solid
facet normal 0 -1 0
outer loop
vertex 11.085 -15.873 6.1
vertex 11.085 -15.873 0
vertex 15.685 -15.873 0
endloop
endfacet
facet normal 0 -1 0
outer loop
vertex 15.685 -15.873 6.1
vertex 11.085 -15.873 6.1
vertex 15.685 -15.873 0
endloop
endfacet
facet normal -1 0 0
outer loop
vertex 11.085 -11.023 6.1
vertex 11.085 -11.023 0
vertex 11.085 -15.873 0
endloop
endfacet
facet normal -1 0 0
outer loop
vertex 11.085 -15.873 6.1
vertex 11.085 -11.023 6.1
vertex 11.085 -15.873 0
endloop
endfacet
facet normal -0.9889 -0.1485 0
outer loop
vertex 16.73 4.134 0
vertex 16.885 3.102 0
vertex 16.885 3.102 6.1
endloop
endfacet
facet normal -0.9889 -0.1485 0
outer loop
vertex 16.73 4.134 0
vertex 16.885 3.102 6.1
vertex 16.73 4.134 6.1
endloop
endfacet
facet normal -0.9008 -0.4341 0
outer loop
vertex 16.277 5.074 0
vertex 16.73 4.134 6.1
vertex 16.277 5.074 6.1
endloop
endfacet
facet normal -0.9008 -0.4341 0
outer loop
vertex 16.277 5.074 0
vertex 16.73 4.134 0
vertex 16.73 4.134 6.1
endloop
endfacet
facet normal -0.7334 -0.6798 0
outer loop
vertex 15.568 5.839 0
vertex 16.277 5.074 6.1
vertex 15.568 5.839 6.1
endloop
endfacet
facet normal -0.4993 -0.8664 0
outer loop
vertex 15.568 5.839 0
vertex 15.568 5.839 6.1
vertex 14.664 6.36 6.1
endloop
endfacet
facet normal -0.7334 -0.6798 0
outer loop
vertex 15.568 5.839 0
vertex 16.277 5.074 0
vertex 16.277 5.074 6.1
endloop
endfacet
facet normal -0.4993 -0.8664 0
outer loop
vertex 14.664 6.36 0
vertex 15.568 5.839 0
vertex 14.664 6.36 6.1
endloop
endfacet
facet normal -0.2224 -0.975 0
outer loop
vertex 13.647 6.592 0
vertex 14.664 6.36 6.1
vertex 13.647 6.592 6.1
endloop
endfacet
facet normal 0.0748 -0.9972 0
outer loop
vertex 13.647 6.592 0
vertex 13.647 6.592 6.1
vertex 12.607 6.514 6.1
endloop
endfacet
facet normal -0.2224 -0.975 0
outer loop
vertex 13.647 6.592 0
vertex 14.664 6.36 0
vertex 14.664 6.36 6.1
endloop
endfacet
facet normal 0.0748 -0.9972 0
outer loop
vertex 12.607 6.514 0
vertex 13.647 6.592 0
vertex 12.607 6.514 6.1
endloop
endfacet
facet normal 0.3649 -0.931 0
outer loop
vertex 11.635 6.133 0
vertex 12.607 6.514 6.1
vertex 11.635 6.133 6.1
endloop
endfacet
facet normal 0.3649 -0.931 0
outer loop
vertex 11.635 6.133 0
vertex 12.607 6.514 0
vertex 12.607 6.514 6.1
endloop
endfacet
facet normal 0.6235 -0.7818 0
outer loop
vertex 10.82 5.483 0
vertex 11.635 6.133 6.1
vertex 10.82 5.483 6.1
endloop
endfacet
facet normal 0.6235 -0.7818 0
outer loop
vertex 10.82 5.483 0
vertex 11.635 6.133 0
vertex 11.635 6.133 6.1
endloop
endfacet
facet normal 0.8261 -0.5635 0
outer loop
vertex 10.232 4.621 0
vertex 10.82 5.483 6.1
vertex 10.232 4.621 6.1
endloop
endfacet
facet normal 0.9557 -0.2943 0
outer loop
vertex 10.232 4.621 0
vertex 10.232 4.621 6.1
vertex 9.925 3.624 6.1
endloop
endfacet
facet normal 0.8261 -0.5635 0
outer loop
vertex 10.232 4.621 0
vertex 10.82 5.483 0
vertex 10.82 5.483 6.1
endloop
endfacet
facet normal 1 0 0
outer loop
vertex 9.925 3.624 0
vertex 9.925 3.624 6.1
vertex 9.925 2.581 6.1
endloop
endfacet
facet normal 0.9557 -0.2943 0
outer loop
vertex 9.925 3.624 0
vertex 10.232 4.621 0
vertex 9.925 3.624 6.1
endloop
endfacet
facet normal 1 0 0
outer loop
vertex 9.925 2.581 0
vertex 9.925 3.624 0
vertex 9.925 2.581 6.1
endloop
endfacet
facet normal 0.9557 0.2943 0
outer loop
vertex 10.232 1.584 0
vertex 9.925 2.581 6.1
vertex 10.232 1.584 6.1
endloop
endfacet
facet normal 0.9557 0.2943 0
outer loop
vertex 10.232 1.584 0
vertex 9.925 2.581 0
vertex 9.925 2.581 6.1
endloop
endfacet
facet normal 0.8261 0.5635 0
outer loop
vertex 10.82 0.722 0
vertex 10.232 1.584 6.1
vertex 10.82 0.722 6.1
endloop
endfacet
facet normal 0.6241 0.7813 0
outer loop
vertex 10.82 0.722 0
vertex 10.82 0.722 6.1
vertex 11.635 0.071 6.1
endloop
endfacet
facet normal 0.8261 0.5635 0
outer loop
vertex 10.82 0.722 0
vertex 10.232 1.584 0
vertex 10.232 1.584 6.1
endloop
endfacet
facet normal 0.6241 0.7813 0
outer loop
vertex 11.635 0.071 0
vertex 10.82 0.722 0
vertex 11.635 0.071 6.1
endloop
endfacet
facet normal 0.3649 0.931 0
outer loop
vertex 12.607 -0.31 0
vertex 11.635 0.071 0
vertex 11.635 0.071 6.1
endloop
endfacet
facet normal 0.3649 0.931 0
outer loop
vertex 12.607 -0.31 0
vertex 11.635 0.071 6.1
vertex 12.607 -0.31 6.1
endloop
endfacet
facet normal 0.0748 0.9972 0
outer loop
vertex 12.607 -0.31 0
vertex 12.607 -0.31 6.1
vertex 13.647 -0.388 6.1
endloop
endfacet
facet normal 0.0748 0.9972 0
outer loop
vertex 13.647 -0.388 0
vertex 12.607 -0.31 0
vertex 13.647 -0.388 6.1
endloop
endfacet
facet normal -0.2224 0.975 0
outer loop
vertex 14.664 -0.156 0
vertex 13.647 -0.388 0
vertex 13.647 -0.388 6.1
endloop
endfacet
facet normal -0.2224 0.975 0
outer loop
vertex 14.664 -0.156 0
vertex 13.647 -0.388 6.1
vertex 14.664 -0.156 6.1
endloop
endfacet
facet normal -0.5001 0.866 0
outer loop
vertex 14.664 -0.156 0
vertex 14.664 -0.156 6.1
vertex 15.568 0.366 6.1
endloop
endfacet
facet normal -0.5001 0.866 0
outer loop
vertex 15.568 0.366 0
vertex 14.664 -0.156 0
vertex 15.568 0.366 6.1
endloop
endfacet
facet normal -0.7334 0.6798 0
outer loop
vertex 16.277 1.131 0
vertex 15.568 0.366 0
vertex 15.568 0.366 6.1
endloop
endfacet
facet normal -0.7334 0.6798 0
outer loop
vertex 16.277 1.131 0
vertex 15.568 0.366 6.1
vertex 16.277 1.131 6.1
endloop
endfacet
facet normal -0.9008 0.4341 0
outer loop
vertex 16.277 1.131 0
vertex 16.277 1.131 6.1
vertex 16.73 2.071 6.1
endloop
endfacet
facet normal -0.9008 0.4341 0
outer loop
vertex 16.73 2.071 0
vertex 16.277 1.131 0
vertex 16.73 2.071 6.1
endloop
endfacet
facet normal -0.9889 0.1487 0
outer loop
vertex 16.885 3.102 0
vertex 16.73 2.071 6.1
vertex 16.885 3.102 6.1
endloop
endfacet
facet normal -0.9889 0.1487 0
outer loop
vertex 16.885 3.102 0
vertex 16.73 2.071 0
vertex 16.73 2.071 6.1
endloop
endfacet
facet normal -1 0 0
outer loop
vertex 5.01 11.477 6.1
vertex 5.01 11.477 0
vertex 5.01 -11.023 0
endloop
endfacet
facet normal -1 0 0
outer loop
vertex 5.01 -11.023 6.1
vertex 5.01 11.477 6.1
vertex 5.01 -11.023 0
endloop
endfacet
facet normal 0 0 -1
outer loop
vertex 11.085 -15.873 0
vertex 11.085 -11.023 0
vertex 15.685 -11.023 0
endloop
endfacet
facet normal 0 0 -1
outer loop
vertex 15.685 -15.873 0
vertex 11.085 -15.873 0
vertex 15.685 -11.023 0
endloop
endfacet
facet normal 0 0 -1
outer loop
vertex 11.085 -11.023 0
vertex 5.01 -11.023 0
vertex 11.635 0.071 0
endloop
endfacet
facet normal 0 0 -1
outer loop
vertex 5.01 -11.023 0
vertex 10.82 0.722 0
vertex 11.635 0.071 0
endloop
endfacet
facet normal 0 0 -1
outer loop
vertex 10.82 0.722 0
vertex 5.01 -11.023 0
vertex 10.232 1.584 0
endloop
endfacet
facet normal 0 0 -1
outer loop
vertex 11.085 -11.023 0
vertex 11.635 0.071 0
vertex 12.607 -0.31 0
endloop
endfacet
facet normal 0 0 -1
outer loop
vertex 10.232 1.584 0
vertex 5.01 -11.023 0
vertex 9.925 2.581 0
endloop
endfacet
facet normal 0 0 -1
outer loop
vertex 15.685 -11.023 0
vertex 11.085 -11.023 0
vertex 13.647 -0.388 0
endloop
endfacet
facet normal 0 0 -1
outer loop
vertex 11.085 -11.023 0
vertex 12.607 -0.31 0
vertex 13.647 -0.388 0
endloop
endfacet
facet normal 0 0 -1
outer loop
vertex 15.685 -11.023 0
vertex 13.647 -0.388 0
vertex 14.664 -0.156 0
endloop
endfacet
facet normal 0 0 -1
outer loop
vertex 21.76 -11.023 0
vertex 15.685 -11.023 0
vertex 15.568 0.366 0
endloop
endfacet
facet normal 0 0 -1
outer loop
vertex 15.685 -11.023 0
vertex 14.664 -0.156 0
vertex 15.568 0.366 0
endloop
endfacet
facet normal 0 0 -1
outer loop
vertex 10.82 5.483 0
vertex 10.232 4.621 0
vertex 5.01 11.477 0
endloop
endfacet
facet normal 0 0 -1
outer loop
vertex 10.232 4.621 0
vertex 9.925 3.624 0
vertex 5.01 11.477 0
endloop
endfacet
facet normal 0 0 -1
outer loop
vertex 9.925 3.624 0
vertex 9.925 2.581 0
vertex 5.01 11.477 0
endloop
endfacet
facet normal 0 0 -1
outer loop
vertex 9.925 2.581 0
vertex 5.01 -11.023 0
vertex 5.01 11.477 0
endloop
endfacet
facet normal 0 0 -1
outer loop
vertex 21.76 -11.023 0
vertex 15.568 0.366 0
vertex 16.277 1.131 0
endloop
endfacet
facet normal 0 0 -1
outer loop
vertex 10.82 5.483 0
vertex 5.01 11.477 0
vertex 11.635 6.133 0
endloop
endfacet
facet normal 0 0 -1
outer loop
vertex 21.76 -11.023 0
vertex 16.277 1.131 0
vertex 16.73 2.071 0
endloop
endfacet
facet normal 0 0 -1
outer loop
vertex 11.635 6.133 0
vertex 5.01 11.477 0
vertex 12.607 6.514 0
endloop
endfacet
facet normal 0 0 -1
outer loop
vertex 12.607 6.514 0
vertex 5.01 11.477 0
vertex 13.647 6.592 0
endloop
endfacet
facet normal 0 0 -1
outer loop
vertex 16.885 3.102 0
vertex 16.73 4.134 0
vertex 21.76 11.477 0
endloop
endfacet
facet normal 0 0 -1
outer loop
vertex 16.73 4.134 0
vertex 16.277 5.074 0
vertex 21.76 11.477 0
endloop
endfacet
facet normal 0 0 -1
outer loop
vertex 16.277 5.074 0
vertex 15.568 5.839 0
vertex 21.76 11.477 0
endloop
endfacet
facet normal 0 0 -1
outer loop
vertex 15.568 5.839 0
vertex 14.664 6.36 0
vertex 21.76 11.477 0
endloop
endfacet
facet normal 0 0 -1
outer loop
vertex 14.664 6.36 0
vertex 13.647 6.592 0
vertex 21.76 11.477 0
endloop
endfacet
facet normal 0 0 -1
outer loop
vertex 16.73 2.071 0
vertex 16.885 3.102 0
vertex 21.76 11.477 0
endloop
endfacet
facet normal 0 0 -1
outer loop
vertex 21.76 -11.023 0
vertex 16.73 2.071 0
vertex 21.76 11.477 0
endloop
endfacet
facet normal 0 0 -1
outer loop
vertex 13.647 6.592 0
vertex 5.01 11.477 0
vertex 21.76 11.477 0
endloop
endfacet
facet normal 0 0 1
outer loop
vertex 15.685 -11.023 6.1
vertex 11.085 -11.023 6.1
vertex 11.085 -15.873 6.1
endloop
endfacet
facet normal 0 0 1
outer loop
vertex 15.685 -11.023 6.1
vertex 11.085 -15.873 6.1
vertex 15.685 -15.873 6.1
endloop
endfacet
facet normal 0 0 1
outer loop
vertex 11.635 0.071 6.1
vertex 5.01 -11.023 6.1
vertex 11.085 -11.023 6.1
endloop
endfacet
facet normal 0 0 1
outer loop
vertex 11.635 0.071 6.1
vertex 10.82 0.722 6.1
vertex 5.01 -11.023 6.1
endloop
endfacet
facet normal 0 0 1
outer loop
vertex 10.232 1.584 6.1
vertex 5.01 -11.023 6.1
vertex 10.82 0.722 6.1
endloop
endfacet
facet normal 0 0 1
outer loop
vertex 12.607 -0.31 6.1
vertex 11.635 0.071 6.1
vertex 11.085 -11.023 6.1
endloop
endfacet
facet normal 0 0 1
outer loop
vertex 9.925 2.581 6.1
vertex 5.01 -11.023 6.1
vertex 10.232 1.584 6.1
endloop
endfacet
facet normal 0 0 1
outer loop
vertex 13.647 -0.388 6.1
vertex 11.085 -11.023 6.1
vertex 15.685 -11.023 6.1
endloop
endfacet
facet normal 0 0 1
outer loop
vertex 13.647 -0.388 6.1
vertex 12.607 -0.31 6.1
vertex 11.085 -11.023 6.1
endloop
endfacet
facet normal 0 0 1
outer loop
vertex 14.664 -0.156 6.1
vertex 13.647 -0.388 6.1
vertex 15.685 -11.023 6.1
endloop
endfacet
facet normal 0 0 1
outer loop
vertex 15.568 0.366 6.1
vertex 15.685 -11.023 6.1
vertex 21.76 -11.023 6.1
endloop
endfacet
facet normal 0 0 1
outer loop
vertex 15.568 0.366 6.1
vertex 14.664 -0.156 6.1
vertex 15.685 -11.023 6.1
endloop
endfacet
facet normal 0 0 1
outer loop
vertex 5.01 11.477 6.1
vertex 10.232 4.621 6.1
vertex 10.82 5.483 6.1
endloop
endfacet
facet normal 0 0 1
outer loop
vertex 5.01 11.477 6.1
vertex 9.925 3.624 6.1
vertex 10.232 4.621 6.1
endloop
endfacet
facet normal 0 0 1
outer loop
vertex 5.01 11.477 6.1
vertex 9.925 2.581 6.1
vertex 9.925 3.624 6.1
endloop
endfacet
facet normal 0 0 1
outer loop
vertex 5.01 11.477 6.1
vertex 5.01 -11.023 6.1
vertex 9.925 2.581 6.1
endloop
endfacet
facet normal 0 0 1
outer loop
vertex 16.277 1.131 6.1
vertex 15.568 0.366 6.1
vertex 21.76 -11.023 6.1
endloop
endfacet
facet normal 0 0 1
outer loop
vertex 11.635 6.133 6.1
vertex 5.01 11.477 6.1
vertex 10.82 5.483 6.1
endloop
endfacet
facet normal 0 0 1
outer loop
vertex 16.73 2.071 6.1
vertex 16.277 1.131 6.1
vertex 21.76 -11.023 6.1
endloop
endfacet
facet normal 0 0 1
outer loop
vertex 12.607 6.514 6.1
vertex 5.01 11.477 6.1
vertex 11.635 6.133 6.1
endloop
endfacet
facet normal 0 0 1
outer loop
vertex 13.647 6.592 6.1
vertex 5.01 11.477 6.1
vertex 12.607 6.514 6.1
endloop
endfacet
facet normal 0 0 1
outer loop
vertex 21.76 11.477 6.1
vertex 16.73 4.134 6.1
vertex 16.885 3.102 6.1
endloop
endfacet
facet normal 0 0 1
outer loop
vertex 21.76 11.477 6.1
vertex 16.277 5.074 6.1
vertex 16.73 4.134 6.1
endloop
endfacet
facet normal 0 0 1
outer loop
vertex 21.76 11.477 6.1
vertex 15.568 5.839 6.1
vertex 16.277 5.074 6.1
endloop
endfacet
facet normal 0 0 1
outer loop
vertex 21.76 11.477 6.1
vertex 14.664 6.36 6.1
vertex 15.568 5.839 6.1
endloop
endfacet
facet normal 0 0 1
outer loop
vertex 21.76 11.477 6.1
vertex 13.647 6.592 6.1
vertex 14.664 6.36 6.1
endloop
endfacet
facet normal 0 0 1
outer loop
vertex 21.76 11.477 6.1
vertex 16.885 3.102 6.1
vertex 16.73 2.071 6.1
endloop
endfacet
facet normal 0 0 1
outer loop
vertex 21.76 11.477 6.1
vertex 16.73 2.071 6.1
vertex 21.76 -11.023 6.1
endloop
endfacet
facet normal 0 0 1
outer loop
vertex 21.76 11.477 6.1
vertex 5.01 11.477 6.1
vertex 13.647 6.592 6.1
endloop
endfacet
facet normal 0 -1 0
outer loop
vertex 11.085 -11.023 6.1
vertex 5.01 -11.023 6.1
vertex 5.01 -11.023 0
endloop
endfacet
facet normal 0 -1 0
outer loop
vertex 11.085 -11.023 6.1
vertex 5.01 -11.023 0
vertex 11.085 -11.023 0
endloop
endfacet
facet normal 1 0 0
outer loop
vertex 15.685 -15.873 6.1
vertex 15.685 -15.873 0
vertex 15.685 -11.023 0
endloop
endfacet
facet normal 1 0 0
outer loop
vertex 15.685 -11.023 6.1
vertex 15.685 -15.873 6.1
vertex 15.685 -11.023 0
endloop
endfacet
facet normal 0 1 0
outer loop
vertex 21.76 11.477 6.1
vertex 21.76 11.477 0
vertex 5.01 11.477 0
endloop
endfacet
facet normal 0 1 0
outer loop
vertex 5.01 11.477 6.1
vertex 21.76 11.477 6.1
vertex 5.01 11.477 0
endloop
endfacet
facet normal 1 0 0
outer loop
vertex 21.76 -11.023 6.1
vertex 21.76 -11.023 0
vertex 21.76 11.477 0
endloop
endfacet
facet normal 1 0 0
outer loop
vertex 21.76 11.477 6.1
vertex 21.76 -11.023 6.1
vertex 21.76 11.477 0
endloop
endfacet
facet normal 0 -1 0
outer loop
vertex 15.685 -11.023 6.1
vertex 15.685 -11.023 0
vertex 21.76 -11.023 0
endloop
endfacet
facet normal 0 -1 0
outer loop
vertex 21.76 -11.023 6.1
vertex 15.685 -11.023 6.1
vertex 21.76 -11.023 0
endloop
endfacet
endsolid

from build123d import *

# Parameters (mm, degrees)
F0_R     = 3.5
F1_DEPTH = 6.1


with BuildPart() as f1:
    # F0 (on Top) → F1 (new body)
    with BuildSketch(Plane.XY):
        Polygon((21.76044, 11.477244), (5.01044, 11.477244), (5.01044, -11.022756), (11.08544, -11.022756), (11.08544, -15.872756), (15.68544, -15.872756), (15.68544, -11.022756), (21.76044, -11.022756), align=None)
        with Locations((13.38544, 3.102244)):
            Circle(F0_R, mode=Mode.SUBTRACT)
    extrude(amount=F1_DEPTH)


solid = f1.part
